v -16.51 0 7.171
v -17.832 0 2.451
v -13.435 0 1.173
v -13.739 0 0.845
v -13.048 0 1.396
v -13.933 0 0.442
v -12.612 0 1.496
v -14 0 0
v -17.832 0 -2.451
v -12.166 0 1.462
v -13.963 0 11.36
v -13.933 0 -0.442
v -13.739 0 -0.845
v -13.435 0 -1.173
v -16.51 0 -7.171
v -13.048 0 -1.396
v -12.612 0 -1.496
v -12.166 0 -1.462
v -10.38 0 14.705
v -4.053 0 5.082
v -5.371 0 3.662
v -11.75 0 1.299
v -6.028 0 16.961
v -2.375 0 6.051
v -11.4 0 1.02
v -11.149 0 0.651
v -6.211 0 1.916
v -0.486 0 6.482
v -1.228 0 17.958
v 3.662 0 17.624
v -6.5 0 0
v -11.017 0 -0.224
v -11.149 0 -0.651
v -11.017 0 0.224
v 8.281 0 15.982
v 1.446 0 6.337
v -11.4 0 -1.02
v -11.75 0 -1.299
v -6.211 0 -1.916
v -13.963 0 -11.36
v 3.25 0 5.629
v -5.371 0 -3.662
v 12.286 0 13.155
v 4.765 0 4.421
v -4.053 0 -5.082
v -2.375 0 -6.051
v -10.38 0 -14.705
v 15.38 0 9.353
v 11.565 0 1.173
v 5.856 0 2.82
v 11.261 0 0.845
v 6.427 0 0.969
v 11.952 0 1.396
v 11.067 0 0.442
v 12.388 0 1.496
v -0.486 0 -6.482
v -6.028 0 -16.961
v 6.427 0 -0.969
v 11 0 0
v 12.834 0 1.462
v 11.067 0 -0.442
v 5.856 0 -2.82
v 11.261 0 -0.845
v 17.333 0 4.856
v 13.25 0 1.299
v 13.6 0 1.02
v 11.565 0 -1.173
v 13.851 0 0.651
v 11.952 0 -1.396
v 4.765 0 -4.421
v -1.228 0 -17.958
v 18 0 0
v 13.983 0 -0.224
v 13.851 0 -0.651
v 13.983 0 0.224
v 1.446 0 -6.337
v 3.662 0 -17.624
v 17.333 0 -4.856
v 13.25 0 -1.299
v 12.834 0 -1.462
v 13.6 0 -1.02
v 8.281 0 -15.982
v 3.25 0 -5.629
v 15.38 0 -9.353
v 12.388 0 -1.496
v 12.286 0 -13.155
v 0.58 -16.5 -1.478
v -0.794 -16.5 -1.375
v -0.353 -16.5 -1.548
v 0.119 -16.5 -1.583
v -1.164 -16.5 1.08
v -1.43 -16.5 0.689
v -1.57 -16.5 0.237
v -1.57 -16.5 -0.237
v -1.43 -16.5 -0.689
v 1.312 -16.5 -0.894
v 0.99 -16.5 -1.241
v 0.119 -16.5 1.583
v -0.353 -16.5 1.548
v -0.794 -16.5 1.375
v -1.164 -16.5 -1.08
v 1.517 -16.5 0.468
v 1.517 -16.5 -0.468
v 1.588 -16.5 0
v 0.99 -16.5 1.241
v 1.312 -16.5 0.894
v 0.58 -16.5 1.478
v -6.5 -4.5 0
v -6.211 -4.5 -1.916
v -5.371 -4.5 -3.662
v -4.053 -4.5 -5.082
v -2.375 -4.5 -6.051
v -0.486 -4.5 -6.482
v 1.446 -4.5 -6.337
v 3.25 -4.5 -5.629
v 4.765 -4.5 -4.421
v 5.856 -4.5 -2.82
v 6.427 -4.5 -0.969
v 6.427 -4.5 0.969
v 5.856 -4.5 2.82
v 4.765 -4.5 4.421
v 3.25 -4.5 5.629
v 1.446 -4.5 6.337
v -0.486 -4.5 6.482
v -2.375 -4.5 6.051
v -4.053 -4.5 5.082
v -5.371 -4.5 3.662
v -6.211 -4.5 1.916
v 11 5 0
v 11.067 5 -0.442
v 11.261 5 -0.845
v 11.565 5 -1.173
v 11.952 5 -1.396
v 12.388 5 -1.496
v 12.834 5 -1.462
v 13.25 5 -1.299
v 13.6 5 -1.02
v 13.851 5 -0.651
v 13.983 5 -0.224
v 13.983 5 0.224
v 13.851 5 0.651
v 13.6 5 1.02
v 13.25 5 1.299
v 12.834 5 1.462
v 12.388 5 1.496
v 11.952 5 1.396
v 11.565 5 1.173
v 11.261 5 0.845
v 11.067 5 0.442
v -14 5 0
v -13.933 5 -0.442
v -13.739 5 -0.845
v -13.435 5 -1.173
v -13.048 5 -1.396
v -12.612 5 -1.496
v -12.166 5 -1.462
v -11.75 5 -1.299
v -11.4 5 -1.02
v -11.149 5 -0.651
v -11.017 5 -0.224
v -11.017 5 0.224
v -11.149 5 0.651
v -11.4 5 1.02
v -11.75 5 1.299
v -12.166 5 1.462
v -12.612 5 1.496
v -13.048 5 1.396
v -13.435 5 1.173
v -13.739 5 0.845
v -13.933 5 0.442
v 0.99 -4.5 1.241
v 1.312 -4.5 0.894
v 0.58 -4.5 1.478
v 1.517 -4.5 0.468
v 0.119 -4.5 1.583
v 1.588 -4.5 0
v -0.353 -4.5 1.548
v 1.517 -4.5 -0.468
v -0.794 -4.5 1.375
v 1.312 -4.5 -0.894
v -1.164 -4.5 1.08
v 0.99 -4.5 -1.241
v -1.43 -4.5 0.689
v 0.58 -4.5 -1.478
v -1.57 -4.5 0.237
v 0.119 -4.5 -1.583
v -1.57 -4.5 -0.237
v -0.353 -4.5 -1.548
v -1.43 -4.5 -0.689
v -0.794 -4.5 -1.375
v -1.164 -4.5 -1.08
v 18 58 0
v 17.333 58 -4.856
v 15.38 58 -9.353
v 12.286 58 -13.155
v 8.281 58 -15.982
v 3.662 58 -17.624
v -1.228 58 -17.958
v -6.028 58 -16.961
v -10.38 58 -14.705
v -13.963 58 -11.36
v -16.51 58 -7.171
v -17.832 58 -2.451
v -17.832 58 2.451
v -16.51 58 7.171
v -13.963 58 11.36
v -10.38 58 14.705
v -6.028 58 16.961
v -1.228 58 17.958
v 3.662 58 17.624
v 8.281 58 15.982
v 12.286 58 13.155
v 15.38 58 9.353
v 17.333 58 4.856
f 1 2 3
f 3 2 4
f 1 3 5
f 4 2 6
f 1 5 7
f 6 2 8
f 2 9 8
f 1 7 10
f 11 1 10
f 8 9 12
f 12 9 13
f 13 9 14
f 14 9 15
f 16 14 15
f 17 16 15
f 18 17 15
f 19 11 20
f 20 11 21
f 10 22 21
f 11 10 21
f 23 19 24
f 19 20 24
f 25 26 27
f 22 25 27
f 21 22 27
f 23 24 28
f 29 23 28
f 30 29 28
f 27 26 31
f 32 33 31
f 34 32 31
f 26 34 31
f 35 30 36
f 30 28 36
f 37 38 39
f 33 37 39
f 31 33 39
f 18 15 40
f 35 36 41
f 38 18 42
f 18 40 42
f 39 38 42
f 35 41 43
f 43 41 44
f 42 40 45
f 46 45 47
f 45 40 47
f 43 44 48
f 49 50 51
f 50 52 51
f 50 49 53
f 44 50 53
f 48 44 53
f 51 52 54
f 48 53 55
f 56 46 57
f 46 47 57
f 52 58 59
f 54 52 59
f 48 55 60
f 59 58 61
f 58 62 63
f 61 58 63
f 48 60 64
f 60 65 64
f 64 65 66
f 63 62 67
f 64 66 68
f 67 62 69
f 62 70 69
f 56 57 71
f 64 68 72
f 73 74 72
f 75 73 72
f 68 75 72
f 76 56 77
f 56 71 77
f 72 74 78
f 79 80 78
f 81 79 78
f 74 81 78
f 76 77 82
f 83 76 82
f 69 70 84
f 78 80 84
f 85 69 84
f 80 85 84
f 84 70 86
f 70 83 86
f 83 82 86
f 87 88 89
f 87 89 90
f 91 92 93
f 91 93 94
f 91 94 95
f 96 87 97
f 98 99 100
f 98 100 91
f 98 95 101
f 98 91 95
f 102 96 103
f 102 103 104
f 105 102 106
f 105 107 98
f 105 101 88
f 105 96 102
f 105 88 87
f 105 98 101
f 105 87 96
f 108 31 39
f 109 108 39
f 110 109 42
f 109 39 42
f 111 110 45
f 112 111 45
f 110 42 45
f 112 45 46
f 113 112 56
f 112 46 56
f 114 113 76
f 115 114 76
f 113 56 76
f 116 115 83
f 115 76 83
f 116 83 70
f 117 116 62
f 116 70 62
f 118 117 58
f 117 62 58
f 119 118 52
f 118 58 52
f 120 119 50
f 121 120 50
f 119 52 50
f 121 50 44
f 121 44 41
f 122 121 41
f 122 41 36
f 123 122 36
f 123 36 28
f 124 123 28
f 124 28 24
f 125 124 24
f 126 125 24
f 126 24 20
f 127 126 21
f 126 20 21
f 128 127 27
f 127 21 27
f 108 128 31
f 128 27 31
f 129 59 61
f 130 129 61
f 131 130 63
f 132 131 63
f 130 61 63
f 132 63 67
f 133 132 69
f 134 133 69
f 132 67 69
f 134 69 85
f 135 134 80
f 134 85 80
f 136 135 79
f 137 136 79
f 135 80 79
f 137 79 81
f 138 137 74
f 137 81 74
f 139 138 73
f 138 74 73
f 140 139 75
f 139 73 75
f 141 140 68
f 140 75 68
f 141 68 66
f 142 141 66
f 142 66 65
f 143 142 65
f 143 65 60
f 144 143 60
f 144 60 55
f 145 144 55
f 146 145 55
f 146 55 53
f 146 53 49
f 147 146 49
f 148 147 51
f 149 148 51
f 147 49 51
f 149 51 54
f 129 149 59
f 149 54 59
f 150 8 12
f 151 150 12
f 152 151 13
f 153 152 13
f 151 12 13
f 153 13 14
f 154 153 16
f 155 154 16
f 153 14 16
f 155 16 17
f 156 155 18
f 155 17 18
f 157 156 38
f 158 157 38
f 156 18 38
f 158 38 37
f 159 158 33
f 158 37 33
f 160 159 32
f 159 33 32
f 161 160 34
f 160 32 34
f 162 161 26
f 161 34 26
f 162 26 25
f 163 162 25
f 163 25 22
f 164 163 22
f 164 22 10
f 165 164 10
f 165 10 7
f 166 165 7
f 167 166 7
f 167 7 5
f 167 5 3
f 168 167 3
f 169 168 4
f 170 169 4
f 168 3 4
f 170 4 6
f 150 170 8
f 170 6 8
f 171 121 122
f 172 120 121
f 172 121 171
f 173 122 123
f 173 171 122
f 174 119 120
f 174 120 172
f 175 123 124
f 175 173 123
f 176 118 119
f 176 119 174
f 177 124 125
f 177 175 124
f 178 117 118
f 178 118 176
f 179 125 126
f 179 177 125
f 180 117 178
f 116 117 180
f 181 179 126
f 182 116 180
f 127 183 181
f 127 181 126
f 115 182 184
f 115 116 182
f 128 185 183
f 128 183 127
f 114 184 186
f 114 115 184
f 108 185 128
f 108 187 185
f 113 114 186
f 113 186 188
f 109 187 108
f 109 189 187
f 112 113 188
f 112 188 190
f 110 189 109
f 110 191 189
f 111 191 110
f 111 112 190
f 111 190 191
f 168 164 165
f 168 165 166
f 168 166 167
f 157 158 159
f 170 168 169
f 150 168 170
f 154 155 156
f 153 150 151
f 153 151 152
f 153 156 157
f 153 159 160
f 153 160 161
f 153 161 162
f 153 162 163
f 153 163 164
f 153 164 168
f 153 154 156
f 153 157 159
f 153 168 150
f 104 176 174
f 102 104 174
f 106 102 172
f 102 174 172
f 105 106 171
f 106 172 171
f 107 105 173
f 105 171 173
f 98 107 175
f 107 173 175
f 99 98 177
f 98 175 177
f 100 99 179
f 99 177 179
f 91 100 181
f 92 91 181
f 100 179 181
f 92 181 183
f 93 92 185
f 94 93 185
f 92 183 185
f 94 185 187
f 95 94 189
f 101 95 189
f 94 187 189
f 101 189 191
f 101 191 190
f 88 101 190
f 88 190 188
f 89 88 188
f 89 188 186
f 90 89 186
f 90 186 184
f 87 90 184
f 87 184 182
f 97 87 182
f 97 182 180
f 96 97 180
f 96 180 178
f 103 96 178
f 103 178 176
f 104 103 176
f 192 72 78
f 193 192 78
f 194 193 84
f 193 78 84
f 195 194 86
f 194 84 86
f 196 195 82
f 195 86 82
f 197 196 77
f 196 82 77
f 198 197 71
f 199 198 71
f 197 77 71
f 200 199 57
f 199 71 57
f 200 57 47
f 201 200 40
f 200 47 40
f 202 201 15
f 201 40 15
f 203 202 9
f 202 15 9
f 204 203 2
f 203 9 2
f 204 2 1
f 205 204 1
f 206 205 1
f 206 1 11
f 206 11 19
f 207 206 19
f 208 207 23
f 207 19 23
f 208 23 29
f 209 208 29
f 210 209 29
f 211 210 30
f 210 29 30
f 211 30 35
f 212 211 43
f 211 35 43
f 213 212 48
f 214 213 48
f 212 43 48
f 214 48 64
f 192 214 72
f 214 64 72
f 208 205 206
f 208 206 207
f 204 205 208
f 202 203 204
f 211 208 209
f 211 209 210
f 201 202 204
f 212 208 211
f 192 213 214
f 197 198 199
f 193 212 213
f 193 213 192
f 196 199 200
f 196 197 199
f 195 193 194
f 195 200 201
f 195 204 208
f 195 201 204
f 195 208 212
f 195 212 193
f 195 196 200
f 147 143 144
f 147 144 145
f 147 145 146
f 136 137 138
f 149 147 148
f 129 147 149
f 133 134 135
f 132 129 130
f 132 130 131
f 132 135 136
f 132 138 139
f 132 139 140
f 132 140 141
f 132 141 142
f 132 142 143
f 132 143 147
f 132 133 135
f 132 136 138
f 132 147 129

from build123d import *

# Parameters (mm, degrees)
SKETCH1_R           = 18
BOSS_EXTRUDE1_DEPTH = 58
SKETCH2_R           = 1.5875
BOSS_EXTRUDE2_DEPTH = 16.5
SKETCH3_R           = 1.5
CUT_EXTRUDE1_DEPTH  = 5
SKETCH3_3_R         = 6.5
SKETCH3_3_R_2       = 1.5875
BOSS_EXTRUDE3_DEPTH = 4.5


with BuildPart() as part:
    # Sketch1 → Boss-Extrude1 (new body)
    with BuildSketch(Plane(origin=(0, 0, 0), x_dir=(1, 0, 0), z_dir=(0, 1, 0))):
        Circle(SKETCH1_R)
    extrude(amount=BOSS_EXTRUDE1_DEPTH)

    # Sketch2 → Boss-Extrude2 (add)
    with BuildSketch(Plane.XZ):
        Circle(SKETCH2_R)
    extrude(amount=BOSS_EXTRUDE2_DEPTH)

    # Sketch3 → Cut-Extrude1 (cut)
    with BuildSketch(Plane(origin=(0, 0, 0), x_dir=(-1, 0, 0), z_dir=(0, -1, 0))):
        with Locations((-12.5, 0)):
            Circle(SKETCH3_R)
        with Locations((12.5, 0)):
            Circle(SKETCH3_R)
    extrude(amount=-CUT_EXTRUDE1_DEPTH, mode=Mode.SUBTRACT)

    # Sketch3<3> → Boss-Extrude3 (add)
    with BuildSketch(Plane(origin=(0, 0, 0), x_dir=(-1, 0, 0), z_dir=(0, -1, 0))):
        Circle(SKETCH3_3_R)
        Circle(SKETCH3_3_R_2, mode=Mode.SUBTRACT)
    extrude(amount=BOSS_EXTRUDE3_DEPTH)


solid = part.part
